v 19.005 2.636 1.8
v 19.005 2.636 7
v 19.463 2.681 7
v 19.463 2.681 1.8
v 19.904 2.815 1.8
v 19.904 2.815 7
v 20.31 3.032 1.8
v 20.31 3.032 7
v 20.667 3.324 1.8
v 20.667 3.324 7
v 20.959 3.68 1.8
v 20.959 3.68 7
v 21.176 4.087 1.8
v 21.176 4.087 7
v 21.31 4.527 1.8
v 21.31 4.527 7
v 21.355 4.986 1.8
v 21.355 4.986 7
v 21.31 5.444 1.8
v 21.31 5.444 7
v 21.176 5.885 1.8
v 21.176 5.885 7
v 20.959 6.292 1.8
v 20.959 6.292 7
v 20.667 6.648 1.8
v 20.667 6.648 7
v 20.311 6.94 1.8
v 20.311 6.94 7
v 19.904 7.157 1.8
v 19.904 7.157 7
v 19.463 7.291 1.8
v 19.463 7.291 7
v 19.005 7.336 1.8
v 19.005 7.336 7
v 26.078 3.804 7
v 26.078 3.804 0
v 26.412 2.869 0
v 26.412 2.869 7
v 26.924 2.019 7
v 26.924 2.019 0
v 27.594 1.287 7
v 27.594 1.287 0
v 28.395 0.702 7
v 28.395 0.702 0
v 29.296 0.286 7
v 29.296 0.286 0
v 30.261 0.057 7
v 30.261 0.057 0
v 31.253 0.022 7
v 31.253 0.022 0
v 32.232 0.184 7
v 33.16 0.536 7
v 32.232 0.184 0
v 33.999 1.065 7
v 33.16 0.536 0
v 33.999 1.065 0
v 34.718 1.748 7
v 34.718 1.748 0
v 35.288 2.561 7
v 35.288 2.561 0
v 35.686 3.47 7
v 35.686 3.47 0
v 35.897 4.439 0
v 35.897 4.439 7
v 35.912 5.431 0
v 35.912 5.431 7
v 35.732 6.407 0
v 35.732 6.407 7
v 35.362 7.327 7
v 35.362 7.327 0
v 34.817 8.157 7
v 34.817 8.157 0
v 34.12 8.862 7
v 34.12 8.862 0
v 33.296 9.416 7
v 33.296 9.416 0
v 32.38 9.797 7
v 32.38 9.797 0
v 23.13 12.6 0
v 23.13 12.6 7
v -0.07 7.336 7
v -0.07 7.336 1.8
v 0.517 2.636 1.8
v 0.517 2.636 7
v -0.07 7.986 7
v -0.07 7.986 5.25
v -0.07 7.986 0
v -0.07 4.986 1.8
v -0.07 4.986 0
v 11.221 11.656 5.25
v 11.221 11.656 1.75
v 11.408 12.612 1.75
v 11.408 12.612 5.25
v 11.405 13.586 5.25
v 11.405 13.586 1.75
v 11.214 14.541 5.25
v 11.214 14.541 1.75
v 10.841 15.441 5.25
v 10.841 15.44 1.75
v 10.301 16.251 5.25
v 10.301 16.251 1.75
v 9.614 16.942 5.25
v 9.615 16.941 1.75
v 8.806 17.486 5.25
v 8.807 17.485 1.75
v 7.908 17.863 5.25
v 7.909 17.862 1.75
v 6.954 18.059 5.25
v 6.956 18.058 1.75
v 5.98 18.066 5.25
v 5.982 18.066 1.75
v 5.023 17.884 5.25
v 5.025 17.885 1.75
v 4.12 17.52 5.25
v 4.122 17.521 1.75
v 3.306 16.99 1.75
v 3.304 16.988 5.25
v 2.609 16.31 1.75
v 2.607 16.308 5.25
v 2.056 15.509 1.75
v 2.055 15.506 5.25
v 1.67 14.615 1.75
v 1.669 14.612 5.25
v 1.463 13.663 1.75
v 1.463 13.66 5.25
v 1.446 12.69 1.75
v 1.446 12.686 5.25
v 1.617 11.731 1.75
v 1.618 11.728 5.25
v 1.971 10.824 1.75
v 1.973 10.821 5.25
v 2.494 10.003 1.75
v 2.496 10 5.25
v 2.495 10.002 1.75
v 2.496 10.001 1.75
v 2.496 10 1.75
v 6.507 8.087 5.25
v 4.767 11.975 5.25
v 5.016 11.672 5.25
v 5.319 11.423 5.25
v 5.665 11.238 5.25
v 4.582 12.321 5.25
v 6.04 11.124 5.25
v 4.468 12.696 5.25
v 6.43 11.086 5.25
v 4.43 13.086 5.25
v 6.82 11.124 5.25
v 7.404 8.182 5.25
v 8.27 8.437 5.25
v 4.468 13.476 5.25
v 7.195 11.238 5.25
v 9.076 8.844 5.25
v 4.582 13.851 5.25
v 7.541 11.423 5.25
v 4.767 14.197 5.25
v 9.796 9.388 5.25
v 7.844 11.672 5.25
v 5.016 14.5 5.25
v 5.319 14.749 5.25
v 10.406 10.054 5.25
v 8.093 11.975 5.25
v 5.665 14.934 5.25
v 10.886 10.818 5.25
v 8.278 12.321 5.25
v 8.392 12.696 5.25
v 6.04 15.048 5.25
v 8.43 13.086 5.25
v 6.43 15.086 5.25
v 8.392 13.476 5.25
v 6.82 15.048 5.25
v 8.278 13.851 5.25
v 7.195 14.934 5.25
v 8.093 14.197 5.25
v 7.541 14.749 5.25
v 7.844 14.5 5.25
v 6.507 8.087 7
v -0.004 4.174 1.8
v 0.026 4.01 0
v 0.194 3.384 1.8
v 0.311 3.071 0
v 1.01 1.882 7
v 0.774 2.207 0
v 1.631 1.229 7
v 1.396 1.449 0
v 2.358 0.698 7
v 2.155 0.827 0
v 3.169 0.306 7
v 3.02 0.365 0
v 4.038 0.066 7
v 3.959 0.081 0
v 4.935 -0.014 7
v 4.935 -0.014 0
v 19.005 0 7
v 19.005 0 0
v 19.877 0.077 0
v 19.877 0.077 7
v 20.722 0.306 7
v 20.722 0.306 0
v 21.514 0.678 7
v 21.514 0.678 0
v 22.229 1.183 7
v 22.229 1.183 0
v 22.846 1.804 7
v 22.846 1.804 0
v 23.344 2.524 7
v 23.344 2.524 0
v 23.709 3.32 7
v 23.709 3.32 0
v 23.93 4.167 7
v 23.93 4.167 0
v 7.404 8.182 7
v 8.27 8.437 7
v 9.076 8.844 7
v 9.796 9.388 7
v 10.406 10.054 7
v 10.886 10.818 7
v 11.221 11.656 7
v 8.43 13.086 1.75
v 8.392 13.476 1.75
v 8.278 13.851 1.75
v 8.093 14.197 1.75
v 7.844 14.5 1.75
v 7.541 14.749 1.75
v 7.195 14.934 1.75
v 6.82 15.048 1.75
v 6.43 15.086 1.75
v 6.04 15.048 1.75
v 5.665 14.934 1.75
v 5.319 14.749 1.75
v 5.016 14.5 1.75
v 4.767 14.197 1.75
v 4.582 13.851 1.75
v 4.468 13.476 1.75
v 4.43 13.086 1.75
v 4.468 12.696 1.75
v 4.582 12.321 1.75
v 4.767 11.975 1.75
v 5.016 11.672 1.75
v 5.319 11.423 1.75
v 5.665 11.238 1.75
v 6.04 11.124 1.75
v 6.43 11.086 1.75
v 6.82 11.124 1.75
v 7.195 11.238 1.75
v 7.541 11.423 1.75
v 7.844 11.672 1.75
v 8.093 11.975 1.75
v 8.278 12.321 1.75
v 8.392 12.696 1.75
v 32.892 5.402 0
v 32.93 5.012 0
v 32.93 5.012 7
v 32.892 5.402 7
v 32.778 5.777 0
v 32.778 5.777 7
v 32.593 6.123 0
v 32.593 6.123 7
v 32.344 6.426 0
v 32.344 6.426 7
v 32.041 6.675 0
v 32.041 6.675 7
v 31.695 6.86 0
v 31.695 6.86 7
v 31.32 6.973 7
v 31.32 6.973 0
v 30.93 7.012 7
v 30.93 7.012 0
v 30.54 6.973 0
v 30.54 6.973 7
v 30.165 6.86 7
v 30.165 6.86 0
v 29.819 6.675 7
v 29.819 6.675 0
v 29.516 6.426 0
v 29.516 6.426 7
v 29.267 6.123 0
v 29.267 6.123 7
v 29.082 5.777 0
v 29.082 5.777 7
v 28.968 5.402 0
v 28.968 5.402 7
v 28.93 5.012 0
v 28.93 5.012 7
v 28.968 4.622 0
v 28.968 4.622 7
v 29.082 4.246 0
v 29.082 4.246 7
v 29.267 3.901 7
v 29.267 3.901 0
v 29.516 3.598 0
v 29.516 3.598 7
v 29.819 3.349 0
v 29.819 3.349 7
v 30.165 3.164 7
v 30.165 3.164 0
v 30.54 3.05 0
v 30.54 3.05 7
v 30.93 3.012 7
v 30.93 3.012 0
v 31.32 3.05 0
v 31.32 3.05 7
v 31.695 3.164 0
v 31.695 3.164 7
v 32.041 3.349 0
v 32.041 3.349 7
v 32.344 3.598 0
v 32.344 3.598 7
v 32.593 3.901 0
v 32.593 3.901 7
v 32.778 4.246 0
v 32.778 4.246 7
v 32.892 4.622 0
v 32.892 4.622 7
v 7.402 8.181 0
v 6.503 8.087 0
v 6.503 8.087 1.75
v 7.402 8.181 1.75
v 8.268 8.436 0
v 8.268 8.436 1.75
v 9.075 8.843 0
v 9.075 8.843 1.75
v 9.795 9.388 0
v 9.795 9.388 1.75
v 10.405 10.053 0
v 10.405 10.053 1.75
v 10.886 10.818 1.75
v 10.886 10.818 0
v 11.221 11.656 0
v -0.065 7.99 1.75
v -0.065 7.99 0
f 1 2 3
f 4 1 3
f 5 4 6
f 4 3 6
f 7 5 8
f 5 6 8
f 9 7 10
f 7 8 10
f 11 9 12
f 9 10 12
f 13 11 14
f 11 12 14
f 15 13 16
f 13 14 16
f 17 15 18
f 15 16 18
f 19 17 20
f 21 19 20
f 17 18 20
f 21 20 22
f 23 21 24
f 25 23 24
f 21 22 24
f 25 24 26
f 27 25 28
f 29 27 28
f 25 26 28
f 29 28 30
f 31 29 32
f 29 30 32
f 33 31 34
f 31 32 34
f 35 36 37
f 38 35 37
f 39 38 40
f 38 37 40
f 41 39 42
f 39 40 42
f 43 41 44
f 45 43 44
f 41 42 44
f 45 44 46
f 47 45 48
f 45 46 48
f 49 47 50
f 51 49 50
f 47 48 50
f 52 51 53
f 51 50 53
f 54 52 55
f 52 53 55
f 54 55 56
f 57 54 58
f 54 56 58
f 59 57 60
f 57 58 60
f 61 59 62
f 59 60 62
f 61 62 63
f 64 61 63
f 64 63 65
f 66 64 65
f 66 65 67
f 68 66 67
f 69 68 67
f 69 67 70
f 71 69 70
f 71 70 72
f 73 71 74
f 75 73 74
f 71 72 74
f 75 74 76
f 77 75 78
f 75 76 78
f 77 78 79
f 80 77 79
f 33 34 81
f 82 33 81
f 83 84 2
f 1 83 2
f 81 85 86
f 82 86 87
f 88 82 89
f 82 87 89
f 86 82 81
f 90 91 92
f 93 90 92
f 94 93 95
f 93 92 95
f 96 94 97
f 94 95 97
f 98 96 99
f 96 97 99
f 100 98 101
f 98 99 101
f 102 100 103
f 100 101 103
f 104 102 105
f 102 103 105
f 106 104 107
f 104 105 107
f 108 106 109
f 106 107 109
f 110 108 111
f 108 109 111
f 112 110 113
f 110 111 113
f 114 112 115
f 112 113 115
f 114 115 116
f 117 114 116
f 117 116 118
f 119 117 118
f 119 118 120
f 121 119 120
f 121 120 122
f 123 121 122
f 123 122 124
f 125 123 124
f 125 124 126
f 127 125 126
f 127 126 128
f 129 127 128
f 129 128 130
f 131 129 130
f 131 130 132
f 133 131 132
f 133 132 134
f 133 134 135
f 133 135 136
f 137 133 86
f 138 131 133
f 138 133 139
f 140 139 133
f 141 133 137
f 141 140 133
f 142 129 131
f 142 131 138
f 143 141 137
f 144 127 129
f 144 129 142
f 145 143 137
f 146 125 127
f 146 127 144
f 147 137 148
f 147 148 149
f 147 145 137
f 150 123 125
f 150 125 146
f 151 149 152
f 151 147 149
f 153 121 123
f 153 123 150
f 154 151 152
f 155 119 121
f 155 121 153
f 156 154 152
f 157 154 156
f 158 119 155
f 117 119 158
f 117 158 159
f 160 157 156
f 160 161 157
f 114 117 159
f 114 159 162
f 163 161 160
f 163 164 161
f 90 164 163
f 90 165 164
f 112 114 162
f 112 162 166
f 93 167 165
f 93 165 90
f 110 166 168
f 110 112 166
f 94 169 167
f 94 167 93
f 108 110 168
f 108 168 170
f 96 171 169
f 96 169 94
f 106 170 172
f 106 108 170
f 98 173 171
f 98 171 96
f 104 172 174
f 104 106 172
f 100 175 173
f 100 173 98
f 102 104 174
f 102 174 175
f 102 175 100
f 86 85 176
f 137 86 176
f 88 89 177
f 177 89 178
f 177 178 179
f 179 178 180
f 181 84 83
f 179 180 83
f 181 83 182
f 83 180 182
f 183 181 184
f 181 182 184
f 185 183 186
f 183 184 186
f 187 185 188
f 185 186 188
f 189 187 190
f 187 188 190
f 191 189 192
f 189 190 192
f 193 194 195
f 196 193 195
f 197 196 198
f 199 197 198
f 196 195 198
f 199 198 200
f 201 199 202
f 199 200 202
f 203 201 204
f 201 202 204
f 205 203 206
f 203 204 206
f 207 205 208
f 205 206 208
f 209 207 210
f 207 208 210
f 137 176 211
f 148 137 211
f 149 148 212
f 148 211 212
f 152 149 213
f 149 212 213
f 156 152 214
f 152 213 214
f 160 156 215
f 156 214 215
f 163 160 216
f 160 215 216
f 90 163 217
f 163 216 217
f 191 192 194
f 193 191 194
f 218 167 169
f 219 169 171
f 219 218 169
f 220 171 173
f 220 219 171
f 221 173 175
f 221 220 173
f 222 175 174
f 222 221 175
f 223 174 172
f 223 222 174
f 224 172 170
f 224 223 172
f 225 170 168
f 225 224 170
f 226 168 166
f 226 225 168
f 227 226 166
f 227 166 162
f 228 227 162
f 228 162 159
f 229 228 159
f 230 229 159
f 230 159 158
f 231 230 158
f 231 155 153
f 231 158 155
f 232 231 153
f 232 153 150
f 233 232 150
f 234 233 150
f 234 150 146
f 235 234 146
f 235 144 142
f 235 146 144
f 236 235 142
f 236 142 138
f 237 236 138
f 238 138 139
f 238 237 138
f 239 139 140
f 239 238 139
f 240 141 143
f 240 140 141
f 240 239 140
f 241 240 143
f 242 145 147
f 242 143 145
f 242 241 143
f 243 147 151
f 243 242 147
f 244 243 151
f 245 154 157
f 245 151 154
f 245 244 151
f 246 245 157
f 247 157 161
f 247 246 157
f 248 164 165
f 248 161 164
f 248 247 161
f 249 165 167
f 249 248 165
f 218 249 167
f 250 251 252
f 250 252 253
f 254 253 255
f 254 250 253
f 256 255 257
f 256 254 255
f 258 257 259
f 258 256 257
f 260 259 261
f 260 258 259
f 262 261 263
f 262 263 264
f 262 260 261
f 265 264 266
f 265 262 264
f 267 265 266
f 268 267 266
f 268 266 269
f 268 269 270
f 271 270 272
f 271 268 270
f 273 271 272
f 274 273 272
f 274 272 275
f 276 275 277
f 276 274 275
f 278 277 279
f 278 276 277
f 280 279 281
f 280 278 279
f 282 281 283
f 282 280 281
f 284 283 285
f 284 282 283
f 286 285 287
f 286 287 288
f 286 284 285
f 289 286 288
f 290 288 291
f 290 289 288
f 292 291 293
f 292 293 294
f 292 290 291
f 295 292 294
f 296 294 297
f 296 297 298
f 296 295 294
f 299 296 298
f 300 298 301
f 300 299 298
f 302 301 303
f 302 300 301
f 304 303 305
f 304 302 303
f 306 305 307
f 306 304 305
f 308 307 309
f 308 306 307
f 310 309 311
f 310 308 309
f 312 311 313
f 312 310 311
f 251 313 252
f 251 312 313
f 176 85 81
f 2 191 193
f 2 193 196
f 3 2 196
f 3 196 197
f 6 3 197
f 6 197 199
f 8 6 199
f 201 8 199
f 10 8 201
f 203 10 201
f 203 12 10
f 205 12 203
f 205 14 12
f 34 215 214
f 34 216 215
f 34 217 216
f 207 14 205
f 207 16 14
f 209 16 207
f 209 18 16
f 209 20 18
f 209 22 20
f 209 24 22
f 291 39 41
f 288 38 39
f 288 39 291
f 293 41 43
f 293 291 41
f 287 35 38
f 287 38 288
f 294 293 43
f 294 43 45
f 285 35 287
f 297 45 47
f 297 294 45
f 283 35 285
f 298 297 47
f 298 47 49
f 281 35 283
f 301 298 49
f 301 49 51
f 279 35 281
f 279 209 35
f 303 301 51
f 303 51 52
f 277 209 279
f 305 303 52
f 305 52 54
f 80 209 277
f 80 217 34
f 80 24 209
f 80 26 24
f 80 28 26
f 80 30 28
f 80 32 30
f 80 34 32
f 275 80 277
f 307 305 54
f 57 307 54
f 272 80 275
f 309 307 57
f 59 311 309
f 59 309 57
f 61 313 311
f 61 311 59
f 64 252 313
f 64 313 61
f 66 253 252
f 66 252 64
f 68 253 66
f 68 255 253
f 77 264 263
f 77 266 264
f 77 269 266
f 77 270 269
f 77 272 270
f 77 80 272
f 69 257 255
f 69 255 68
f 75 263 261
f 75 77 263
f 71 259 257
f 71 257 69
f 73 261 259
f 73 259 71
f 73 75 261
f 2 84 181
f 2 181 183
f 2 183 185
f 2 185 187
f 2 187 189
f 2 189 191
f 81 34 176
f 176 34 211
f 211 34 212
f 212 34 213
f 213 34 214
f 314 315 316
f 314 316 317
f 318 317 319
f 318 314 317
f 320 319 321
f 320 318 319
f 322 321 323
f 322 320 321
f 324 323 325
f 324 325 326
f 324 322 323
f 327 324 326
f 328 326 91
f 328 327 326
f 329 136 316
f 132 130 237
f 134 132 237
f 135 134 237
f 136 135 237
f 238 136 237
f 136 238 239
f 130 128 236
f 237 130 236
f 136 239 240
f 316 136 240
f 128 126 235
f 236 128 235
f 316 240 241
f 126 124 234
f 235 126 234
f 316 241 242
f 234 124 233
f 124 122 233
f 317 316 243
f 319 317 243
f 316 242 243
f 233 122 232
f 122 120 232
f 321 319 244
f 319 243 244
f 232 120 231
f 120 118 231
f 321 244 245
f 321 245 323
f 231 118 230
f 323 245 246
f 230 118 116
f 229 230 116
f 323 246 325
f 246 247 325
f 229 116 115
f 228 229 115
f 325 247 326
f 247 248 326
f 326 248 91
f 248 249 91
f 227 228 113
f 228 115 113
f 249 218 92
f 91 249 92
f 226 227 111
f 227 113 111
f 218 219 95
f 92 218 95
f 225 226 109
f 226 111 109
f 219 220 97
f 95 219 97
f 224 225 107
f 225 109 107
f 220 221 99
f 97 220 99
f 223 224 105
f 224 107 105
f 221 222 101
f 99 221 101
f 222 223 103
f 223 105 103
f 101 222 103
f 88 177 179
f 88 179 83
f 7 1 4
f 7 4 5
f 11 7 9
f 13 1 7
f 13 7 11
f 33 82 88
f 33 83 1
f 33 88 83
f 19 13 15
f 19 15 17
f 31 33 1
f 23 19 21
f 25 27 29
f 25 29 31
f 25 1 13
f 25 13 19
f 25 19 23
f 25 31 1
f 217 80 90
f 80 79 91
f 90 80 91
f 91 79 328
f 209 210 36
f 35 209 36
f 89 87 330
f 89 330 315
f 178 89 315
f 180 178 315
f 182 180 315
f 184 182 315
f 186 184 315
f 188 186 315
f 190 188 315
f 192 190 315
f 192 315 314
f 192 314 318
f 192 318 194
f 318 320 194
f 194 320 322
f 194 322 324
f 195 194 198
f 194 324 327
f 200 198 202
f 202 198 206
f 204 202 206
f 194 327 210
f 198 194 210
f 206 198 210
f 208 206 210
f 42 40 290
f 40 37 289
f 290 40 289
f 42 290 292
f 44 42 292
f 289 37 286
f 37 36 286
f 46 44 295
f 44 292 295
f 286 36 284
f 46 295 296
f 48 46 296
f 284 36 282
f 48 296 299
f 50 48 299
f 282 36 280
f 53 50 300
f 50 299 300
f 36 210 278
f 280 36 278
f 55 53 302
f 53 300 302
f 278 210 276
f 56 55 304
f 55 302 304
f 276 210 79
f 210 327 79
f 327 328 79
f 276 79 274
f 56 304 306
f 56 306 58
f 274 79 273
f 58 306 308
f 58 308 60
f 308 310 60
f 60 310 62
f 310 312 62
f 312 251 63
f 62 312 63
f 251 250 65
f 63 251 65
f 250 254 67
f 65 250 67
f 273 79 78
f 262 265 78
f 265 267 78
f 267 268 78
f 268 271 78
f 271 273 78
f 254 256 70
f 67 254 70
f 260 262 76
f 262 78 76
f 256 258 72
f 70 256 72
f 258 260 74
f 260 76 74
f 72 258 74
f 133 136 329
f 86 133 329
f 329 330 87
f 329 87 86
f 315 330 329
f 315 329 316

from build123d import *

# Parameters (mm, degrees)
F0_R     = 2
F1_DEPTH = 7
F3_DEPTH = 5.2
F4_R     = 2
F5_DEPTH = 1.75
F7_DEPTH = 1.75


with BuildPart() as f1:
    # F0 (on Top) → F1 (new body)
    with BuildSketch(Plane.XY):
        with BuildLine():
            Line((4.9350217689, -0.0139416518), (19.004955283, 2.4555e-06))
            ThreePointArc((19.004955283, 2.4555e-06), (22.2293780558, 1.1827867006), (23.9300664859, 4.1666666667))
            Line((23.9300664859, 4.1666666667), (26.0782552237, 3.8035564963))
            ThreePointArc((26.0782552237, 3.8035564963), (34.3758111212, 1.3887256489), (32.3801124961, 9.7969376403))
            Line((32.3801124961, 9.7969376403), (23.1300664859, 12.6000024555))
            Line((23.1300664859, 12.6000024555), (11.221314861, 11.6563943987))
            ThreePointArc((11.221314861, 11.6563943987), (5.4972893091, 17.9982805275), (2.4963756955, 9.9996240357))
            Line((2.4963756955, 9.9996240357), (-0.0699335141, 7.9860583482))
            Line((-0.0699335141, 7.9860583482), (-0.0699335141, 4.9860558927))
            ThreePointArc((-0.0699335141, 4.9860558927), (1.3962849714, 1.4487704636), (4.9350217689, -0.0139416518))
        make_face()
        with Locations((30.9300664859, 5.0118209214)):
            Circle(F0_R, mode=Mode.SUBTRACT)
        with Locations((6.4300664859, 13.0860583482)):
            Circle(F0_R, mode=Mode.SUBTRACT)
    extrude(amount=F1_DEPTH)

    # F2 (on face) → F3 (cut)
    with BuildSketch(Plane.XY.offset(7)):
        with BuildLine():
            Line((19.004955283, 7.3360559031), (-0.0699335141, 7.3360559031))
            Line((-0.0699335141, 7.3360559031), (-0.0699335141, 4.9860558927))
            ThreePointArc((-0.0699335141, 4.9860558927), (0.0789501004, 3.7749944518), (0.5167344114, 2.6360558927))
            Line((0.5167344114, 2.6360558927), (19.0047344114, 2.6360558927))
            ThreePointArc((19.0047344114, 2.6360558927), (21.3549552908, 4.985945457), (19.004955283, 7.3360559031))
        make_face()
    extrude(amount=-F3_DEPTH, mode=Mode.SUBTRACT)

    # F4 (on face) → F5 (cut)
    with BuildSketch(Plane.XY):
        with BuildLine():
            Line((-0.064623992, 7.9902242809), (6.5034230268, 8.0865964954))
            ThreePointArc((6.5034230268, 8.0865964954), (9.4470118806, 9.0988236567), (11.221314861, 11.6563943987))
            ThreePointArc((11.221314861, 11.6563943987), (5.4991508888, 17.9986336557), (2.494037584, 10.0026063081))
            ThreePointArc((2.494037584, 10.0026063081), (2.4952063572, 10.0011149504), (2.4963756955, 9.9996240357))
            Line((2.4963756955, 9.9996240357), (-0.064623992, 7.9902242809))
        make_face()
        with Locations((6.4300664859, 13.0860583482)):
            Circle(F4_R, mode=Mode.SUBTRACT)
    extrude(amount=F5_DEPTH, mode=Mode.SUBTRACT)

    # F6 (on face) → F7 (cut)
    with BuildSketch(Plane.XY.offset(7)):
        with BuildLine():
            Line((-0.0699335141, 7.9860583482), (6.5065307879, 8.0866430614))
            ThreePointArc((6.5065307879, 8.0866430614), (8.5828375136, 17.5988819546), (2.4963756955, 9.9996240357))
            Line((2.4963756955, 9.9996240357), (-0.0699335141, 7.9860583482))
        make_face()
    extrude(amount=-F7_DEPTH, mode=Mode.SUBTRACT)


solid = f1.part
